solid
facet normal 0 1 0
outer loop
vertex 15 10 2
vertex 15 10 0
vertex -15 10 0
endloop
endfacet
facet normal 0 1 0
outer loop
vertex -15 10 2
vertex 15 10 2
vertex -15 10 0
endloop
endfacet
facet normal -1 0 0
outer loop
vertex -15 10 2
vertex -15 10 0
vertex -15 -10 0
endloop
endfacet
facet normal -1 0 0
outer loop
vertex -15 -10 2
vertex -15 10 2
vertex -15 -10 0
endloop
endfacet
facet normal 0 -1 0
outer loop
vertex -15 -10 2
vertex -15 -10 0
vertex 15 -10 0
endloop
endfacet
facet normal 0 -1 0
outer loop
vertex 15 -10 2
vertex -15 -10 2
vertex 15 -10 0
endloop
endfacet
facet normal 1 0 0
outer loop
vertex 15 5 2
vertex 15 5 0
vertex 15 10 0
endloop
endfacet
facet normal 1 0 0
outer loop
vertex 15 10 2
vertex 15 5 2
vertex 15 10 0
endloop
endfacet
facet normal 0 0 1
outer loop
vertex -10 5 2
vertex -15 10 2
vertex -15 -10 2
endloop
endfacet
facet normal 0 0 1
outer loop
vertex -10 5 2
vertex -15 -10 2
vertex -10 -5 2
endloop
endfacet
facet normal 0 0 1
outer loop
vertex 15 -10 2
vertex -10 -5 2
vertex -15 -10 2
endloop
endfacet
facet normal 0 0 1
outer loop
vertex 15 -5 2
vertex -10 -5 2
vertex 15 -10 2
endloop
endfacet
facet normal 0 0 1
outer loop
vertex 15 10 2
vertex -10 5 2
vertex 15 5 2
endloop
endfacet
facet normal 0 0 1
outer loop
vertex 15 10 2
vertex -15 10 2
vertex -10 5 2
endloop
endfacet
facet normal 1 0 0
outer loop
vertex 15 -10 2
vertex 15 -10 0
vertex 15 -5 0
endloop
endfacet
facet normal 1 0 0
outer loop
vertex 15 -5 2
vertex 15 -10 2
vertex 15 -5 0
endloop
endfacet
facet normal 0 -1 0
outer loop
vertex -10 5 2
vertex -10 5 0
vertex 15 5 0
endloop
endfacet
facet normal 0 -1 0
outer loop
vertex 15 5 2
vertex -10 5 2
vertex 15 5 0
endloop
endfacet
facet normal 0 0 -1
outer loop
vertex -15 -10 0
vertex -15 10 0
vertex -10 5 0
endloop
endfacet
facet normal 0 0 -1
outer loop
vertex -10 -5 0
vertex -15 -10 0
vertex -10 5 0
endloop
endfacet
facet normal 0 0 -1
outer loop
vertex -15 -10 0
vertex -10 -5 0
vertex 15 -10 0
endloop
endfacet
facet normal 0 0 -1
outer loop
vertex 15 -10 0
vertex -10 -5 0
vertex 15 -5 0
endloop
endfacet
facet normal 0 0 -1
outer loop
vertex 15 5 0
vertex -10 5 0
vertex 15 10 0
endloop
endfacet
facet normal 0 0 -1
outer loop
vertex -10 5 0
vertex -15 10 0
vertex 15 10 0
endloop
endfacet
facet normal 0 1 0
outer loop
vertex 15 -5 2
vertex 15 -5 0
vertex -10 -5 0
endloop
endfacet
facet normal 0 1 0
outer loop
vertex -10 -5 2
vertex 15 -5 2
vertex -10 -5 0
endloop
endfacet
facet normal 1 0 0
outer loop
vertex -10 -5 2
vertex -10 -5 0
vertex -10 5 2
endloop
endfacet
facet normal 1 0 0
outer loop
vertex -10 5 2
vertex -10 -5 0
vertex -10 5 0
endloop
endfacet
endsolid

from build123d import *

# Parameters (mm, degrees)
BOSS_EXTRUDE1_DEPTH = 2


with BuildPart() as part:
    # Sketch1 → Boss-Extrude1 (new body)
    with BuildSketch(Plane.XY):
        Polygon((-15, 10), (-15, 0), (-10, 0), (-10, 5), (7.5, 5), (15, 10), align=None)
        Polygon((-7.5, -5), (-15, -10), (15, -10), (15, -5), align=None)
        Polygon((15, 10), (7.5, 5), (15, 5), align=None)
        Polygon((-15, 0), (-15, -10), (-7.5, -5), (-10, -5), (-10, 0), align=None)
    extrude(amount=BOSS_EXTRUDE1_DEPTH)


solid = part.part
